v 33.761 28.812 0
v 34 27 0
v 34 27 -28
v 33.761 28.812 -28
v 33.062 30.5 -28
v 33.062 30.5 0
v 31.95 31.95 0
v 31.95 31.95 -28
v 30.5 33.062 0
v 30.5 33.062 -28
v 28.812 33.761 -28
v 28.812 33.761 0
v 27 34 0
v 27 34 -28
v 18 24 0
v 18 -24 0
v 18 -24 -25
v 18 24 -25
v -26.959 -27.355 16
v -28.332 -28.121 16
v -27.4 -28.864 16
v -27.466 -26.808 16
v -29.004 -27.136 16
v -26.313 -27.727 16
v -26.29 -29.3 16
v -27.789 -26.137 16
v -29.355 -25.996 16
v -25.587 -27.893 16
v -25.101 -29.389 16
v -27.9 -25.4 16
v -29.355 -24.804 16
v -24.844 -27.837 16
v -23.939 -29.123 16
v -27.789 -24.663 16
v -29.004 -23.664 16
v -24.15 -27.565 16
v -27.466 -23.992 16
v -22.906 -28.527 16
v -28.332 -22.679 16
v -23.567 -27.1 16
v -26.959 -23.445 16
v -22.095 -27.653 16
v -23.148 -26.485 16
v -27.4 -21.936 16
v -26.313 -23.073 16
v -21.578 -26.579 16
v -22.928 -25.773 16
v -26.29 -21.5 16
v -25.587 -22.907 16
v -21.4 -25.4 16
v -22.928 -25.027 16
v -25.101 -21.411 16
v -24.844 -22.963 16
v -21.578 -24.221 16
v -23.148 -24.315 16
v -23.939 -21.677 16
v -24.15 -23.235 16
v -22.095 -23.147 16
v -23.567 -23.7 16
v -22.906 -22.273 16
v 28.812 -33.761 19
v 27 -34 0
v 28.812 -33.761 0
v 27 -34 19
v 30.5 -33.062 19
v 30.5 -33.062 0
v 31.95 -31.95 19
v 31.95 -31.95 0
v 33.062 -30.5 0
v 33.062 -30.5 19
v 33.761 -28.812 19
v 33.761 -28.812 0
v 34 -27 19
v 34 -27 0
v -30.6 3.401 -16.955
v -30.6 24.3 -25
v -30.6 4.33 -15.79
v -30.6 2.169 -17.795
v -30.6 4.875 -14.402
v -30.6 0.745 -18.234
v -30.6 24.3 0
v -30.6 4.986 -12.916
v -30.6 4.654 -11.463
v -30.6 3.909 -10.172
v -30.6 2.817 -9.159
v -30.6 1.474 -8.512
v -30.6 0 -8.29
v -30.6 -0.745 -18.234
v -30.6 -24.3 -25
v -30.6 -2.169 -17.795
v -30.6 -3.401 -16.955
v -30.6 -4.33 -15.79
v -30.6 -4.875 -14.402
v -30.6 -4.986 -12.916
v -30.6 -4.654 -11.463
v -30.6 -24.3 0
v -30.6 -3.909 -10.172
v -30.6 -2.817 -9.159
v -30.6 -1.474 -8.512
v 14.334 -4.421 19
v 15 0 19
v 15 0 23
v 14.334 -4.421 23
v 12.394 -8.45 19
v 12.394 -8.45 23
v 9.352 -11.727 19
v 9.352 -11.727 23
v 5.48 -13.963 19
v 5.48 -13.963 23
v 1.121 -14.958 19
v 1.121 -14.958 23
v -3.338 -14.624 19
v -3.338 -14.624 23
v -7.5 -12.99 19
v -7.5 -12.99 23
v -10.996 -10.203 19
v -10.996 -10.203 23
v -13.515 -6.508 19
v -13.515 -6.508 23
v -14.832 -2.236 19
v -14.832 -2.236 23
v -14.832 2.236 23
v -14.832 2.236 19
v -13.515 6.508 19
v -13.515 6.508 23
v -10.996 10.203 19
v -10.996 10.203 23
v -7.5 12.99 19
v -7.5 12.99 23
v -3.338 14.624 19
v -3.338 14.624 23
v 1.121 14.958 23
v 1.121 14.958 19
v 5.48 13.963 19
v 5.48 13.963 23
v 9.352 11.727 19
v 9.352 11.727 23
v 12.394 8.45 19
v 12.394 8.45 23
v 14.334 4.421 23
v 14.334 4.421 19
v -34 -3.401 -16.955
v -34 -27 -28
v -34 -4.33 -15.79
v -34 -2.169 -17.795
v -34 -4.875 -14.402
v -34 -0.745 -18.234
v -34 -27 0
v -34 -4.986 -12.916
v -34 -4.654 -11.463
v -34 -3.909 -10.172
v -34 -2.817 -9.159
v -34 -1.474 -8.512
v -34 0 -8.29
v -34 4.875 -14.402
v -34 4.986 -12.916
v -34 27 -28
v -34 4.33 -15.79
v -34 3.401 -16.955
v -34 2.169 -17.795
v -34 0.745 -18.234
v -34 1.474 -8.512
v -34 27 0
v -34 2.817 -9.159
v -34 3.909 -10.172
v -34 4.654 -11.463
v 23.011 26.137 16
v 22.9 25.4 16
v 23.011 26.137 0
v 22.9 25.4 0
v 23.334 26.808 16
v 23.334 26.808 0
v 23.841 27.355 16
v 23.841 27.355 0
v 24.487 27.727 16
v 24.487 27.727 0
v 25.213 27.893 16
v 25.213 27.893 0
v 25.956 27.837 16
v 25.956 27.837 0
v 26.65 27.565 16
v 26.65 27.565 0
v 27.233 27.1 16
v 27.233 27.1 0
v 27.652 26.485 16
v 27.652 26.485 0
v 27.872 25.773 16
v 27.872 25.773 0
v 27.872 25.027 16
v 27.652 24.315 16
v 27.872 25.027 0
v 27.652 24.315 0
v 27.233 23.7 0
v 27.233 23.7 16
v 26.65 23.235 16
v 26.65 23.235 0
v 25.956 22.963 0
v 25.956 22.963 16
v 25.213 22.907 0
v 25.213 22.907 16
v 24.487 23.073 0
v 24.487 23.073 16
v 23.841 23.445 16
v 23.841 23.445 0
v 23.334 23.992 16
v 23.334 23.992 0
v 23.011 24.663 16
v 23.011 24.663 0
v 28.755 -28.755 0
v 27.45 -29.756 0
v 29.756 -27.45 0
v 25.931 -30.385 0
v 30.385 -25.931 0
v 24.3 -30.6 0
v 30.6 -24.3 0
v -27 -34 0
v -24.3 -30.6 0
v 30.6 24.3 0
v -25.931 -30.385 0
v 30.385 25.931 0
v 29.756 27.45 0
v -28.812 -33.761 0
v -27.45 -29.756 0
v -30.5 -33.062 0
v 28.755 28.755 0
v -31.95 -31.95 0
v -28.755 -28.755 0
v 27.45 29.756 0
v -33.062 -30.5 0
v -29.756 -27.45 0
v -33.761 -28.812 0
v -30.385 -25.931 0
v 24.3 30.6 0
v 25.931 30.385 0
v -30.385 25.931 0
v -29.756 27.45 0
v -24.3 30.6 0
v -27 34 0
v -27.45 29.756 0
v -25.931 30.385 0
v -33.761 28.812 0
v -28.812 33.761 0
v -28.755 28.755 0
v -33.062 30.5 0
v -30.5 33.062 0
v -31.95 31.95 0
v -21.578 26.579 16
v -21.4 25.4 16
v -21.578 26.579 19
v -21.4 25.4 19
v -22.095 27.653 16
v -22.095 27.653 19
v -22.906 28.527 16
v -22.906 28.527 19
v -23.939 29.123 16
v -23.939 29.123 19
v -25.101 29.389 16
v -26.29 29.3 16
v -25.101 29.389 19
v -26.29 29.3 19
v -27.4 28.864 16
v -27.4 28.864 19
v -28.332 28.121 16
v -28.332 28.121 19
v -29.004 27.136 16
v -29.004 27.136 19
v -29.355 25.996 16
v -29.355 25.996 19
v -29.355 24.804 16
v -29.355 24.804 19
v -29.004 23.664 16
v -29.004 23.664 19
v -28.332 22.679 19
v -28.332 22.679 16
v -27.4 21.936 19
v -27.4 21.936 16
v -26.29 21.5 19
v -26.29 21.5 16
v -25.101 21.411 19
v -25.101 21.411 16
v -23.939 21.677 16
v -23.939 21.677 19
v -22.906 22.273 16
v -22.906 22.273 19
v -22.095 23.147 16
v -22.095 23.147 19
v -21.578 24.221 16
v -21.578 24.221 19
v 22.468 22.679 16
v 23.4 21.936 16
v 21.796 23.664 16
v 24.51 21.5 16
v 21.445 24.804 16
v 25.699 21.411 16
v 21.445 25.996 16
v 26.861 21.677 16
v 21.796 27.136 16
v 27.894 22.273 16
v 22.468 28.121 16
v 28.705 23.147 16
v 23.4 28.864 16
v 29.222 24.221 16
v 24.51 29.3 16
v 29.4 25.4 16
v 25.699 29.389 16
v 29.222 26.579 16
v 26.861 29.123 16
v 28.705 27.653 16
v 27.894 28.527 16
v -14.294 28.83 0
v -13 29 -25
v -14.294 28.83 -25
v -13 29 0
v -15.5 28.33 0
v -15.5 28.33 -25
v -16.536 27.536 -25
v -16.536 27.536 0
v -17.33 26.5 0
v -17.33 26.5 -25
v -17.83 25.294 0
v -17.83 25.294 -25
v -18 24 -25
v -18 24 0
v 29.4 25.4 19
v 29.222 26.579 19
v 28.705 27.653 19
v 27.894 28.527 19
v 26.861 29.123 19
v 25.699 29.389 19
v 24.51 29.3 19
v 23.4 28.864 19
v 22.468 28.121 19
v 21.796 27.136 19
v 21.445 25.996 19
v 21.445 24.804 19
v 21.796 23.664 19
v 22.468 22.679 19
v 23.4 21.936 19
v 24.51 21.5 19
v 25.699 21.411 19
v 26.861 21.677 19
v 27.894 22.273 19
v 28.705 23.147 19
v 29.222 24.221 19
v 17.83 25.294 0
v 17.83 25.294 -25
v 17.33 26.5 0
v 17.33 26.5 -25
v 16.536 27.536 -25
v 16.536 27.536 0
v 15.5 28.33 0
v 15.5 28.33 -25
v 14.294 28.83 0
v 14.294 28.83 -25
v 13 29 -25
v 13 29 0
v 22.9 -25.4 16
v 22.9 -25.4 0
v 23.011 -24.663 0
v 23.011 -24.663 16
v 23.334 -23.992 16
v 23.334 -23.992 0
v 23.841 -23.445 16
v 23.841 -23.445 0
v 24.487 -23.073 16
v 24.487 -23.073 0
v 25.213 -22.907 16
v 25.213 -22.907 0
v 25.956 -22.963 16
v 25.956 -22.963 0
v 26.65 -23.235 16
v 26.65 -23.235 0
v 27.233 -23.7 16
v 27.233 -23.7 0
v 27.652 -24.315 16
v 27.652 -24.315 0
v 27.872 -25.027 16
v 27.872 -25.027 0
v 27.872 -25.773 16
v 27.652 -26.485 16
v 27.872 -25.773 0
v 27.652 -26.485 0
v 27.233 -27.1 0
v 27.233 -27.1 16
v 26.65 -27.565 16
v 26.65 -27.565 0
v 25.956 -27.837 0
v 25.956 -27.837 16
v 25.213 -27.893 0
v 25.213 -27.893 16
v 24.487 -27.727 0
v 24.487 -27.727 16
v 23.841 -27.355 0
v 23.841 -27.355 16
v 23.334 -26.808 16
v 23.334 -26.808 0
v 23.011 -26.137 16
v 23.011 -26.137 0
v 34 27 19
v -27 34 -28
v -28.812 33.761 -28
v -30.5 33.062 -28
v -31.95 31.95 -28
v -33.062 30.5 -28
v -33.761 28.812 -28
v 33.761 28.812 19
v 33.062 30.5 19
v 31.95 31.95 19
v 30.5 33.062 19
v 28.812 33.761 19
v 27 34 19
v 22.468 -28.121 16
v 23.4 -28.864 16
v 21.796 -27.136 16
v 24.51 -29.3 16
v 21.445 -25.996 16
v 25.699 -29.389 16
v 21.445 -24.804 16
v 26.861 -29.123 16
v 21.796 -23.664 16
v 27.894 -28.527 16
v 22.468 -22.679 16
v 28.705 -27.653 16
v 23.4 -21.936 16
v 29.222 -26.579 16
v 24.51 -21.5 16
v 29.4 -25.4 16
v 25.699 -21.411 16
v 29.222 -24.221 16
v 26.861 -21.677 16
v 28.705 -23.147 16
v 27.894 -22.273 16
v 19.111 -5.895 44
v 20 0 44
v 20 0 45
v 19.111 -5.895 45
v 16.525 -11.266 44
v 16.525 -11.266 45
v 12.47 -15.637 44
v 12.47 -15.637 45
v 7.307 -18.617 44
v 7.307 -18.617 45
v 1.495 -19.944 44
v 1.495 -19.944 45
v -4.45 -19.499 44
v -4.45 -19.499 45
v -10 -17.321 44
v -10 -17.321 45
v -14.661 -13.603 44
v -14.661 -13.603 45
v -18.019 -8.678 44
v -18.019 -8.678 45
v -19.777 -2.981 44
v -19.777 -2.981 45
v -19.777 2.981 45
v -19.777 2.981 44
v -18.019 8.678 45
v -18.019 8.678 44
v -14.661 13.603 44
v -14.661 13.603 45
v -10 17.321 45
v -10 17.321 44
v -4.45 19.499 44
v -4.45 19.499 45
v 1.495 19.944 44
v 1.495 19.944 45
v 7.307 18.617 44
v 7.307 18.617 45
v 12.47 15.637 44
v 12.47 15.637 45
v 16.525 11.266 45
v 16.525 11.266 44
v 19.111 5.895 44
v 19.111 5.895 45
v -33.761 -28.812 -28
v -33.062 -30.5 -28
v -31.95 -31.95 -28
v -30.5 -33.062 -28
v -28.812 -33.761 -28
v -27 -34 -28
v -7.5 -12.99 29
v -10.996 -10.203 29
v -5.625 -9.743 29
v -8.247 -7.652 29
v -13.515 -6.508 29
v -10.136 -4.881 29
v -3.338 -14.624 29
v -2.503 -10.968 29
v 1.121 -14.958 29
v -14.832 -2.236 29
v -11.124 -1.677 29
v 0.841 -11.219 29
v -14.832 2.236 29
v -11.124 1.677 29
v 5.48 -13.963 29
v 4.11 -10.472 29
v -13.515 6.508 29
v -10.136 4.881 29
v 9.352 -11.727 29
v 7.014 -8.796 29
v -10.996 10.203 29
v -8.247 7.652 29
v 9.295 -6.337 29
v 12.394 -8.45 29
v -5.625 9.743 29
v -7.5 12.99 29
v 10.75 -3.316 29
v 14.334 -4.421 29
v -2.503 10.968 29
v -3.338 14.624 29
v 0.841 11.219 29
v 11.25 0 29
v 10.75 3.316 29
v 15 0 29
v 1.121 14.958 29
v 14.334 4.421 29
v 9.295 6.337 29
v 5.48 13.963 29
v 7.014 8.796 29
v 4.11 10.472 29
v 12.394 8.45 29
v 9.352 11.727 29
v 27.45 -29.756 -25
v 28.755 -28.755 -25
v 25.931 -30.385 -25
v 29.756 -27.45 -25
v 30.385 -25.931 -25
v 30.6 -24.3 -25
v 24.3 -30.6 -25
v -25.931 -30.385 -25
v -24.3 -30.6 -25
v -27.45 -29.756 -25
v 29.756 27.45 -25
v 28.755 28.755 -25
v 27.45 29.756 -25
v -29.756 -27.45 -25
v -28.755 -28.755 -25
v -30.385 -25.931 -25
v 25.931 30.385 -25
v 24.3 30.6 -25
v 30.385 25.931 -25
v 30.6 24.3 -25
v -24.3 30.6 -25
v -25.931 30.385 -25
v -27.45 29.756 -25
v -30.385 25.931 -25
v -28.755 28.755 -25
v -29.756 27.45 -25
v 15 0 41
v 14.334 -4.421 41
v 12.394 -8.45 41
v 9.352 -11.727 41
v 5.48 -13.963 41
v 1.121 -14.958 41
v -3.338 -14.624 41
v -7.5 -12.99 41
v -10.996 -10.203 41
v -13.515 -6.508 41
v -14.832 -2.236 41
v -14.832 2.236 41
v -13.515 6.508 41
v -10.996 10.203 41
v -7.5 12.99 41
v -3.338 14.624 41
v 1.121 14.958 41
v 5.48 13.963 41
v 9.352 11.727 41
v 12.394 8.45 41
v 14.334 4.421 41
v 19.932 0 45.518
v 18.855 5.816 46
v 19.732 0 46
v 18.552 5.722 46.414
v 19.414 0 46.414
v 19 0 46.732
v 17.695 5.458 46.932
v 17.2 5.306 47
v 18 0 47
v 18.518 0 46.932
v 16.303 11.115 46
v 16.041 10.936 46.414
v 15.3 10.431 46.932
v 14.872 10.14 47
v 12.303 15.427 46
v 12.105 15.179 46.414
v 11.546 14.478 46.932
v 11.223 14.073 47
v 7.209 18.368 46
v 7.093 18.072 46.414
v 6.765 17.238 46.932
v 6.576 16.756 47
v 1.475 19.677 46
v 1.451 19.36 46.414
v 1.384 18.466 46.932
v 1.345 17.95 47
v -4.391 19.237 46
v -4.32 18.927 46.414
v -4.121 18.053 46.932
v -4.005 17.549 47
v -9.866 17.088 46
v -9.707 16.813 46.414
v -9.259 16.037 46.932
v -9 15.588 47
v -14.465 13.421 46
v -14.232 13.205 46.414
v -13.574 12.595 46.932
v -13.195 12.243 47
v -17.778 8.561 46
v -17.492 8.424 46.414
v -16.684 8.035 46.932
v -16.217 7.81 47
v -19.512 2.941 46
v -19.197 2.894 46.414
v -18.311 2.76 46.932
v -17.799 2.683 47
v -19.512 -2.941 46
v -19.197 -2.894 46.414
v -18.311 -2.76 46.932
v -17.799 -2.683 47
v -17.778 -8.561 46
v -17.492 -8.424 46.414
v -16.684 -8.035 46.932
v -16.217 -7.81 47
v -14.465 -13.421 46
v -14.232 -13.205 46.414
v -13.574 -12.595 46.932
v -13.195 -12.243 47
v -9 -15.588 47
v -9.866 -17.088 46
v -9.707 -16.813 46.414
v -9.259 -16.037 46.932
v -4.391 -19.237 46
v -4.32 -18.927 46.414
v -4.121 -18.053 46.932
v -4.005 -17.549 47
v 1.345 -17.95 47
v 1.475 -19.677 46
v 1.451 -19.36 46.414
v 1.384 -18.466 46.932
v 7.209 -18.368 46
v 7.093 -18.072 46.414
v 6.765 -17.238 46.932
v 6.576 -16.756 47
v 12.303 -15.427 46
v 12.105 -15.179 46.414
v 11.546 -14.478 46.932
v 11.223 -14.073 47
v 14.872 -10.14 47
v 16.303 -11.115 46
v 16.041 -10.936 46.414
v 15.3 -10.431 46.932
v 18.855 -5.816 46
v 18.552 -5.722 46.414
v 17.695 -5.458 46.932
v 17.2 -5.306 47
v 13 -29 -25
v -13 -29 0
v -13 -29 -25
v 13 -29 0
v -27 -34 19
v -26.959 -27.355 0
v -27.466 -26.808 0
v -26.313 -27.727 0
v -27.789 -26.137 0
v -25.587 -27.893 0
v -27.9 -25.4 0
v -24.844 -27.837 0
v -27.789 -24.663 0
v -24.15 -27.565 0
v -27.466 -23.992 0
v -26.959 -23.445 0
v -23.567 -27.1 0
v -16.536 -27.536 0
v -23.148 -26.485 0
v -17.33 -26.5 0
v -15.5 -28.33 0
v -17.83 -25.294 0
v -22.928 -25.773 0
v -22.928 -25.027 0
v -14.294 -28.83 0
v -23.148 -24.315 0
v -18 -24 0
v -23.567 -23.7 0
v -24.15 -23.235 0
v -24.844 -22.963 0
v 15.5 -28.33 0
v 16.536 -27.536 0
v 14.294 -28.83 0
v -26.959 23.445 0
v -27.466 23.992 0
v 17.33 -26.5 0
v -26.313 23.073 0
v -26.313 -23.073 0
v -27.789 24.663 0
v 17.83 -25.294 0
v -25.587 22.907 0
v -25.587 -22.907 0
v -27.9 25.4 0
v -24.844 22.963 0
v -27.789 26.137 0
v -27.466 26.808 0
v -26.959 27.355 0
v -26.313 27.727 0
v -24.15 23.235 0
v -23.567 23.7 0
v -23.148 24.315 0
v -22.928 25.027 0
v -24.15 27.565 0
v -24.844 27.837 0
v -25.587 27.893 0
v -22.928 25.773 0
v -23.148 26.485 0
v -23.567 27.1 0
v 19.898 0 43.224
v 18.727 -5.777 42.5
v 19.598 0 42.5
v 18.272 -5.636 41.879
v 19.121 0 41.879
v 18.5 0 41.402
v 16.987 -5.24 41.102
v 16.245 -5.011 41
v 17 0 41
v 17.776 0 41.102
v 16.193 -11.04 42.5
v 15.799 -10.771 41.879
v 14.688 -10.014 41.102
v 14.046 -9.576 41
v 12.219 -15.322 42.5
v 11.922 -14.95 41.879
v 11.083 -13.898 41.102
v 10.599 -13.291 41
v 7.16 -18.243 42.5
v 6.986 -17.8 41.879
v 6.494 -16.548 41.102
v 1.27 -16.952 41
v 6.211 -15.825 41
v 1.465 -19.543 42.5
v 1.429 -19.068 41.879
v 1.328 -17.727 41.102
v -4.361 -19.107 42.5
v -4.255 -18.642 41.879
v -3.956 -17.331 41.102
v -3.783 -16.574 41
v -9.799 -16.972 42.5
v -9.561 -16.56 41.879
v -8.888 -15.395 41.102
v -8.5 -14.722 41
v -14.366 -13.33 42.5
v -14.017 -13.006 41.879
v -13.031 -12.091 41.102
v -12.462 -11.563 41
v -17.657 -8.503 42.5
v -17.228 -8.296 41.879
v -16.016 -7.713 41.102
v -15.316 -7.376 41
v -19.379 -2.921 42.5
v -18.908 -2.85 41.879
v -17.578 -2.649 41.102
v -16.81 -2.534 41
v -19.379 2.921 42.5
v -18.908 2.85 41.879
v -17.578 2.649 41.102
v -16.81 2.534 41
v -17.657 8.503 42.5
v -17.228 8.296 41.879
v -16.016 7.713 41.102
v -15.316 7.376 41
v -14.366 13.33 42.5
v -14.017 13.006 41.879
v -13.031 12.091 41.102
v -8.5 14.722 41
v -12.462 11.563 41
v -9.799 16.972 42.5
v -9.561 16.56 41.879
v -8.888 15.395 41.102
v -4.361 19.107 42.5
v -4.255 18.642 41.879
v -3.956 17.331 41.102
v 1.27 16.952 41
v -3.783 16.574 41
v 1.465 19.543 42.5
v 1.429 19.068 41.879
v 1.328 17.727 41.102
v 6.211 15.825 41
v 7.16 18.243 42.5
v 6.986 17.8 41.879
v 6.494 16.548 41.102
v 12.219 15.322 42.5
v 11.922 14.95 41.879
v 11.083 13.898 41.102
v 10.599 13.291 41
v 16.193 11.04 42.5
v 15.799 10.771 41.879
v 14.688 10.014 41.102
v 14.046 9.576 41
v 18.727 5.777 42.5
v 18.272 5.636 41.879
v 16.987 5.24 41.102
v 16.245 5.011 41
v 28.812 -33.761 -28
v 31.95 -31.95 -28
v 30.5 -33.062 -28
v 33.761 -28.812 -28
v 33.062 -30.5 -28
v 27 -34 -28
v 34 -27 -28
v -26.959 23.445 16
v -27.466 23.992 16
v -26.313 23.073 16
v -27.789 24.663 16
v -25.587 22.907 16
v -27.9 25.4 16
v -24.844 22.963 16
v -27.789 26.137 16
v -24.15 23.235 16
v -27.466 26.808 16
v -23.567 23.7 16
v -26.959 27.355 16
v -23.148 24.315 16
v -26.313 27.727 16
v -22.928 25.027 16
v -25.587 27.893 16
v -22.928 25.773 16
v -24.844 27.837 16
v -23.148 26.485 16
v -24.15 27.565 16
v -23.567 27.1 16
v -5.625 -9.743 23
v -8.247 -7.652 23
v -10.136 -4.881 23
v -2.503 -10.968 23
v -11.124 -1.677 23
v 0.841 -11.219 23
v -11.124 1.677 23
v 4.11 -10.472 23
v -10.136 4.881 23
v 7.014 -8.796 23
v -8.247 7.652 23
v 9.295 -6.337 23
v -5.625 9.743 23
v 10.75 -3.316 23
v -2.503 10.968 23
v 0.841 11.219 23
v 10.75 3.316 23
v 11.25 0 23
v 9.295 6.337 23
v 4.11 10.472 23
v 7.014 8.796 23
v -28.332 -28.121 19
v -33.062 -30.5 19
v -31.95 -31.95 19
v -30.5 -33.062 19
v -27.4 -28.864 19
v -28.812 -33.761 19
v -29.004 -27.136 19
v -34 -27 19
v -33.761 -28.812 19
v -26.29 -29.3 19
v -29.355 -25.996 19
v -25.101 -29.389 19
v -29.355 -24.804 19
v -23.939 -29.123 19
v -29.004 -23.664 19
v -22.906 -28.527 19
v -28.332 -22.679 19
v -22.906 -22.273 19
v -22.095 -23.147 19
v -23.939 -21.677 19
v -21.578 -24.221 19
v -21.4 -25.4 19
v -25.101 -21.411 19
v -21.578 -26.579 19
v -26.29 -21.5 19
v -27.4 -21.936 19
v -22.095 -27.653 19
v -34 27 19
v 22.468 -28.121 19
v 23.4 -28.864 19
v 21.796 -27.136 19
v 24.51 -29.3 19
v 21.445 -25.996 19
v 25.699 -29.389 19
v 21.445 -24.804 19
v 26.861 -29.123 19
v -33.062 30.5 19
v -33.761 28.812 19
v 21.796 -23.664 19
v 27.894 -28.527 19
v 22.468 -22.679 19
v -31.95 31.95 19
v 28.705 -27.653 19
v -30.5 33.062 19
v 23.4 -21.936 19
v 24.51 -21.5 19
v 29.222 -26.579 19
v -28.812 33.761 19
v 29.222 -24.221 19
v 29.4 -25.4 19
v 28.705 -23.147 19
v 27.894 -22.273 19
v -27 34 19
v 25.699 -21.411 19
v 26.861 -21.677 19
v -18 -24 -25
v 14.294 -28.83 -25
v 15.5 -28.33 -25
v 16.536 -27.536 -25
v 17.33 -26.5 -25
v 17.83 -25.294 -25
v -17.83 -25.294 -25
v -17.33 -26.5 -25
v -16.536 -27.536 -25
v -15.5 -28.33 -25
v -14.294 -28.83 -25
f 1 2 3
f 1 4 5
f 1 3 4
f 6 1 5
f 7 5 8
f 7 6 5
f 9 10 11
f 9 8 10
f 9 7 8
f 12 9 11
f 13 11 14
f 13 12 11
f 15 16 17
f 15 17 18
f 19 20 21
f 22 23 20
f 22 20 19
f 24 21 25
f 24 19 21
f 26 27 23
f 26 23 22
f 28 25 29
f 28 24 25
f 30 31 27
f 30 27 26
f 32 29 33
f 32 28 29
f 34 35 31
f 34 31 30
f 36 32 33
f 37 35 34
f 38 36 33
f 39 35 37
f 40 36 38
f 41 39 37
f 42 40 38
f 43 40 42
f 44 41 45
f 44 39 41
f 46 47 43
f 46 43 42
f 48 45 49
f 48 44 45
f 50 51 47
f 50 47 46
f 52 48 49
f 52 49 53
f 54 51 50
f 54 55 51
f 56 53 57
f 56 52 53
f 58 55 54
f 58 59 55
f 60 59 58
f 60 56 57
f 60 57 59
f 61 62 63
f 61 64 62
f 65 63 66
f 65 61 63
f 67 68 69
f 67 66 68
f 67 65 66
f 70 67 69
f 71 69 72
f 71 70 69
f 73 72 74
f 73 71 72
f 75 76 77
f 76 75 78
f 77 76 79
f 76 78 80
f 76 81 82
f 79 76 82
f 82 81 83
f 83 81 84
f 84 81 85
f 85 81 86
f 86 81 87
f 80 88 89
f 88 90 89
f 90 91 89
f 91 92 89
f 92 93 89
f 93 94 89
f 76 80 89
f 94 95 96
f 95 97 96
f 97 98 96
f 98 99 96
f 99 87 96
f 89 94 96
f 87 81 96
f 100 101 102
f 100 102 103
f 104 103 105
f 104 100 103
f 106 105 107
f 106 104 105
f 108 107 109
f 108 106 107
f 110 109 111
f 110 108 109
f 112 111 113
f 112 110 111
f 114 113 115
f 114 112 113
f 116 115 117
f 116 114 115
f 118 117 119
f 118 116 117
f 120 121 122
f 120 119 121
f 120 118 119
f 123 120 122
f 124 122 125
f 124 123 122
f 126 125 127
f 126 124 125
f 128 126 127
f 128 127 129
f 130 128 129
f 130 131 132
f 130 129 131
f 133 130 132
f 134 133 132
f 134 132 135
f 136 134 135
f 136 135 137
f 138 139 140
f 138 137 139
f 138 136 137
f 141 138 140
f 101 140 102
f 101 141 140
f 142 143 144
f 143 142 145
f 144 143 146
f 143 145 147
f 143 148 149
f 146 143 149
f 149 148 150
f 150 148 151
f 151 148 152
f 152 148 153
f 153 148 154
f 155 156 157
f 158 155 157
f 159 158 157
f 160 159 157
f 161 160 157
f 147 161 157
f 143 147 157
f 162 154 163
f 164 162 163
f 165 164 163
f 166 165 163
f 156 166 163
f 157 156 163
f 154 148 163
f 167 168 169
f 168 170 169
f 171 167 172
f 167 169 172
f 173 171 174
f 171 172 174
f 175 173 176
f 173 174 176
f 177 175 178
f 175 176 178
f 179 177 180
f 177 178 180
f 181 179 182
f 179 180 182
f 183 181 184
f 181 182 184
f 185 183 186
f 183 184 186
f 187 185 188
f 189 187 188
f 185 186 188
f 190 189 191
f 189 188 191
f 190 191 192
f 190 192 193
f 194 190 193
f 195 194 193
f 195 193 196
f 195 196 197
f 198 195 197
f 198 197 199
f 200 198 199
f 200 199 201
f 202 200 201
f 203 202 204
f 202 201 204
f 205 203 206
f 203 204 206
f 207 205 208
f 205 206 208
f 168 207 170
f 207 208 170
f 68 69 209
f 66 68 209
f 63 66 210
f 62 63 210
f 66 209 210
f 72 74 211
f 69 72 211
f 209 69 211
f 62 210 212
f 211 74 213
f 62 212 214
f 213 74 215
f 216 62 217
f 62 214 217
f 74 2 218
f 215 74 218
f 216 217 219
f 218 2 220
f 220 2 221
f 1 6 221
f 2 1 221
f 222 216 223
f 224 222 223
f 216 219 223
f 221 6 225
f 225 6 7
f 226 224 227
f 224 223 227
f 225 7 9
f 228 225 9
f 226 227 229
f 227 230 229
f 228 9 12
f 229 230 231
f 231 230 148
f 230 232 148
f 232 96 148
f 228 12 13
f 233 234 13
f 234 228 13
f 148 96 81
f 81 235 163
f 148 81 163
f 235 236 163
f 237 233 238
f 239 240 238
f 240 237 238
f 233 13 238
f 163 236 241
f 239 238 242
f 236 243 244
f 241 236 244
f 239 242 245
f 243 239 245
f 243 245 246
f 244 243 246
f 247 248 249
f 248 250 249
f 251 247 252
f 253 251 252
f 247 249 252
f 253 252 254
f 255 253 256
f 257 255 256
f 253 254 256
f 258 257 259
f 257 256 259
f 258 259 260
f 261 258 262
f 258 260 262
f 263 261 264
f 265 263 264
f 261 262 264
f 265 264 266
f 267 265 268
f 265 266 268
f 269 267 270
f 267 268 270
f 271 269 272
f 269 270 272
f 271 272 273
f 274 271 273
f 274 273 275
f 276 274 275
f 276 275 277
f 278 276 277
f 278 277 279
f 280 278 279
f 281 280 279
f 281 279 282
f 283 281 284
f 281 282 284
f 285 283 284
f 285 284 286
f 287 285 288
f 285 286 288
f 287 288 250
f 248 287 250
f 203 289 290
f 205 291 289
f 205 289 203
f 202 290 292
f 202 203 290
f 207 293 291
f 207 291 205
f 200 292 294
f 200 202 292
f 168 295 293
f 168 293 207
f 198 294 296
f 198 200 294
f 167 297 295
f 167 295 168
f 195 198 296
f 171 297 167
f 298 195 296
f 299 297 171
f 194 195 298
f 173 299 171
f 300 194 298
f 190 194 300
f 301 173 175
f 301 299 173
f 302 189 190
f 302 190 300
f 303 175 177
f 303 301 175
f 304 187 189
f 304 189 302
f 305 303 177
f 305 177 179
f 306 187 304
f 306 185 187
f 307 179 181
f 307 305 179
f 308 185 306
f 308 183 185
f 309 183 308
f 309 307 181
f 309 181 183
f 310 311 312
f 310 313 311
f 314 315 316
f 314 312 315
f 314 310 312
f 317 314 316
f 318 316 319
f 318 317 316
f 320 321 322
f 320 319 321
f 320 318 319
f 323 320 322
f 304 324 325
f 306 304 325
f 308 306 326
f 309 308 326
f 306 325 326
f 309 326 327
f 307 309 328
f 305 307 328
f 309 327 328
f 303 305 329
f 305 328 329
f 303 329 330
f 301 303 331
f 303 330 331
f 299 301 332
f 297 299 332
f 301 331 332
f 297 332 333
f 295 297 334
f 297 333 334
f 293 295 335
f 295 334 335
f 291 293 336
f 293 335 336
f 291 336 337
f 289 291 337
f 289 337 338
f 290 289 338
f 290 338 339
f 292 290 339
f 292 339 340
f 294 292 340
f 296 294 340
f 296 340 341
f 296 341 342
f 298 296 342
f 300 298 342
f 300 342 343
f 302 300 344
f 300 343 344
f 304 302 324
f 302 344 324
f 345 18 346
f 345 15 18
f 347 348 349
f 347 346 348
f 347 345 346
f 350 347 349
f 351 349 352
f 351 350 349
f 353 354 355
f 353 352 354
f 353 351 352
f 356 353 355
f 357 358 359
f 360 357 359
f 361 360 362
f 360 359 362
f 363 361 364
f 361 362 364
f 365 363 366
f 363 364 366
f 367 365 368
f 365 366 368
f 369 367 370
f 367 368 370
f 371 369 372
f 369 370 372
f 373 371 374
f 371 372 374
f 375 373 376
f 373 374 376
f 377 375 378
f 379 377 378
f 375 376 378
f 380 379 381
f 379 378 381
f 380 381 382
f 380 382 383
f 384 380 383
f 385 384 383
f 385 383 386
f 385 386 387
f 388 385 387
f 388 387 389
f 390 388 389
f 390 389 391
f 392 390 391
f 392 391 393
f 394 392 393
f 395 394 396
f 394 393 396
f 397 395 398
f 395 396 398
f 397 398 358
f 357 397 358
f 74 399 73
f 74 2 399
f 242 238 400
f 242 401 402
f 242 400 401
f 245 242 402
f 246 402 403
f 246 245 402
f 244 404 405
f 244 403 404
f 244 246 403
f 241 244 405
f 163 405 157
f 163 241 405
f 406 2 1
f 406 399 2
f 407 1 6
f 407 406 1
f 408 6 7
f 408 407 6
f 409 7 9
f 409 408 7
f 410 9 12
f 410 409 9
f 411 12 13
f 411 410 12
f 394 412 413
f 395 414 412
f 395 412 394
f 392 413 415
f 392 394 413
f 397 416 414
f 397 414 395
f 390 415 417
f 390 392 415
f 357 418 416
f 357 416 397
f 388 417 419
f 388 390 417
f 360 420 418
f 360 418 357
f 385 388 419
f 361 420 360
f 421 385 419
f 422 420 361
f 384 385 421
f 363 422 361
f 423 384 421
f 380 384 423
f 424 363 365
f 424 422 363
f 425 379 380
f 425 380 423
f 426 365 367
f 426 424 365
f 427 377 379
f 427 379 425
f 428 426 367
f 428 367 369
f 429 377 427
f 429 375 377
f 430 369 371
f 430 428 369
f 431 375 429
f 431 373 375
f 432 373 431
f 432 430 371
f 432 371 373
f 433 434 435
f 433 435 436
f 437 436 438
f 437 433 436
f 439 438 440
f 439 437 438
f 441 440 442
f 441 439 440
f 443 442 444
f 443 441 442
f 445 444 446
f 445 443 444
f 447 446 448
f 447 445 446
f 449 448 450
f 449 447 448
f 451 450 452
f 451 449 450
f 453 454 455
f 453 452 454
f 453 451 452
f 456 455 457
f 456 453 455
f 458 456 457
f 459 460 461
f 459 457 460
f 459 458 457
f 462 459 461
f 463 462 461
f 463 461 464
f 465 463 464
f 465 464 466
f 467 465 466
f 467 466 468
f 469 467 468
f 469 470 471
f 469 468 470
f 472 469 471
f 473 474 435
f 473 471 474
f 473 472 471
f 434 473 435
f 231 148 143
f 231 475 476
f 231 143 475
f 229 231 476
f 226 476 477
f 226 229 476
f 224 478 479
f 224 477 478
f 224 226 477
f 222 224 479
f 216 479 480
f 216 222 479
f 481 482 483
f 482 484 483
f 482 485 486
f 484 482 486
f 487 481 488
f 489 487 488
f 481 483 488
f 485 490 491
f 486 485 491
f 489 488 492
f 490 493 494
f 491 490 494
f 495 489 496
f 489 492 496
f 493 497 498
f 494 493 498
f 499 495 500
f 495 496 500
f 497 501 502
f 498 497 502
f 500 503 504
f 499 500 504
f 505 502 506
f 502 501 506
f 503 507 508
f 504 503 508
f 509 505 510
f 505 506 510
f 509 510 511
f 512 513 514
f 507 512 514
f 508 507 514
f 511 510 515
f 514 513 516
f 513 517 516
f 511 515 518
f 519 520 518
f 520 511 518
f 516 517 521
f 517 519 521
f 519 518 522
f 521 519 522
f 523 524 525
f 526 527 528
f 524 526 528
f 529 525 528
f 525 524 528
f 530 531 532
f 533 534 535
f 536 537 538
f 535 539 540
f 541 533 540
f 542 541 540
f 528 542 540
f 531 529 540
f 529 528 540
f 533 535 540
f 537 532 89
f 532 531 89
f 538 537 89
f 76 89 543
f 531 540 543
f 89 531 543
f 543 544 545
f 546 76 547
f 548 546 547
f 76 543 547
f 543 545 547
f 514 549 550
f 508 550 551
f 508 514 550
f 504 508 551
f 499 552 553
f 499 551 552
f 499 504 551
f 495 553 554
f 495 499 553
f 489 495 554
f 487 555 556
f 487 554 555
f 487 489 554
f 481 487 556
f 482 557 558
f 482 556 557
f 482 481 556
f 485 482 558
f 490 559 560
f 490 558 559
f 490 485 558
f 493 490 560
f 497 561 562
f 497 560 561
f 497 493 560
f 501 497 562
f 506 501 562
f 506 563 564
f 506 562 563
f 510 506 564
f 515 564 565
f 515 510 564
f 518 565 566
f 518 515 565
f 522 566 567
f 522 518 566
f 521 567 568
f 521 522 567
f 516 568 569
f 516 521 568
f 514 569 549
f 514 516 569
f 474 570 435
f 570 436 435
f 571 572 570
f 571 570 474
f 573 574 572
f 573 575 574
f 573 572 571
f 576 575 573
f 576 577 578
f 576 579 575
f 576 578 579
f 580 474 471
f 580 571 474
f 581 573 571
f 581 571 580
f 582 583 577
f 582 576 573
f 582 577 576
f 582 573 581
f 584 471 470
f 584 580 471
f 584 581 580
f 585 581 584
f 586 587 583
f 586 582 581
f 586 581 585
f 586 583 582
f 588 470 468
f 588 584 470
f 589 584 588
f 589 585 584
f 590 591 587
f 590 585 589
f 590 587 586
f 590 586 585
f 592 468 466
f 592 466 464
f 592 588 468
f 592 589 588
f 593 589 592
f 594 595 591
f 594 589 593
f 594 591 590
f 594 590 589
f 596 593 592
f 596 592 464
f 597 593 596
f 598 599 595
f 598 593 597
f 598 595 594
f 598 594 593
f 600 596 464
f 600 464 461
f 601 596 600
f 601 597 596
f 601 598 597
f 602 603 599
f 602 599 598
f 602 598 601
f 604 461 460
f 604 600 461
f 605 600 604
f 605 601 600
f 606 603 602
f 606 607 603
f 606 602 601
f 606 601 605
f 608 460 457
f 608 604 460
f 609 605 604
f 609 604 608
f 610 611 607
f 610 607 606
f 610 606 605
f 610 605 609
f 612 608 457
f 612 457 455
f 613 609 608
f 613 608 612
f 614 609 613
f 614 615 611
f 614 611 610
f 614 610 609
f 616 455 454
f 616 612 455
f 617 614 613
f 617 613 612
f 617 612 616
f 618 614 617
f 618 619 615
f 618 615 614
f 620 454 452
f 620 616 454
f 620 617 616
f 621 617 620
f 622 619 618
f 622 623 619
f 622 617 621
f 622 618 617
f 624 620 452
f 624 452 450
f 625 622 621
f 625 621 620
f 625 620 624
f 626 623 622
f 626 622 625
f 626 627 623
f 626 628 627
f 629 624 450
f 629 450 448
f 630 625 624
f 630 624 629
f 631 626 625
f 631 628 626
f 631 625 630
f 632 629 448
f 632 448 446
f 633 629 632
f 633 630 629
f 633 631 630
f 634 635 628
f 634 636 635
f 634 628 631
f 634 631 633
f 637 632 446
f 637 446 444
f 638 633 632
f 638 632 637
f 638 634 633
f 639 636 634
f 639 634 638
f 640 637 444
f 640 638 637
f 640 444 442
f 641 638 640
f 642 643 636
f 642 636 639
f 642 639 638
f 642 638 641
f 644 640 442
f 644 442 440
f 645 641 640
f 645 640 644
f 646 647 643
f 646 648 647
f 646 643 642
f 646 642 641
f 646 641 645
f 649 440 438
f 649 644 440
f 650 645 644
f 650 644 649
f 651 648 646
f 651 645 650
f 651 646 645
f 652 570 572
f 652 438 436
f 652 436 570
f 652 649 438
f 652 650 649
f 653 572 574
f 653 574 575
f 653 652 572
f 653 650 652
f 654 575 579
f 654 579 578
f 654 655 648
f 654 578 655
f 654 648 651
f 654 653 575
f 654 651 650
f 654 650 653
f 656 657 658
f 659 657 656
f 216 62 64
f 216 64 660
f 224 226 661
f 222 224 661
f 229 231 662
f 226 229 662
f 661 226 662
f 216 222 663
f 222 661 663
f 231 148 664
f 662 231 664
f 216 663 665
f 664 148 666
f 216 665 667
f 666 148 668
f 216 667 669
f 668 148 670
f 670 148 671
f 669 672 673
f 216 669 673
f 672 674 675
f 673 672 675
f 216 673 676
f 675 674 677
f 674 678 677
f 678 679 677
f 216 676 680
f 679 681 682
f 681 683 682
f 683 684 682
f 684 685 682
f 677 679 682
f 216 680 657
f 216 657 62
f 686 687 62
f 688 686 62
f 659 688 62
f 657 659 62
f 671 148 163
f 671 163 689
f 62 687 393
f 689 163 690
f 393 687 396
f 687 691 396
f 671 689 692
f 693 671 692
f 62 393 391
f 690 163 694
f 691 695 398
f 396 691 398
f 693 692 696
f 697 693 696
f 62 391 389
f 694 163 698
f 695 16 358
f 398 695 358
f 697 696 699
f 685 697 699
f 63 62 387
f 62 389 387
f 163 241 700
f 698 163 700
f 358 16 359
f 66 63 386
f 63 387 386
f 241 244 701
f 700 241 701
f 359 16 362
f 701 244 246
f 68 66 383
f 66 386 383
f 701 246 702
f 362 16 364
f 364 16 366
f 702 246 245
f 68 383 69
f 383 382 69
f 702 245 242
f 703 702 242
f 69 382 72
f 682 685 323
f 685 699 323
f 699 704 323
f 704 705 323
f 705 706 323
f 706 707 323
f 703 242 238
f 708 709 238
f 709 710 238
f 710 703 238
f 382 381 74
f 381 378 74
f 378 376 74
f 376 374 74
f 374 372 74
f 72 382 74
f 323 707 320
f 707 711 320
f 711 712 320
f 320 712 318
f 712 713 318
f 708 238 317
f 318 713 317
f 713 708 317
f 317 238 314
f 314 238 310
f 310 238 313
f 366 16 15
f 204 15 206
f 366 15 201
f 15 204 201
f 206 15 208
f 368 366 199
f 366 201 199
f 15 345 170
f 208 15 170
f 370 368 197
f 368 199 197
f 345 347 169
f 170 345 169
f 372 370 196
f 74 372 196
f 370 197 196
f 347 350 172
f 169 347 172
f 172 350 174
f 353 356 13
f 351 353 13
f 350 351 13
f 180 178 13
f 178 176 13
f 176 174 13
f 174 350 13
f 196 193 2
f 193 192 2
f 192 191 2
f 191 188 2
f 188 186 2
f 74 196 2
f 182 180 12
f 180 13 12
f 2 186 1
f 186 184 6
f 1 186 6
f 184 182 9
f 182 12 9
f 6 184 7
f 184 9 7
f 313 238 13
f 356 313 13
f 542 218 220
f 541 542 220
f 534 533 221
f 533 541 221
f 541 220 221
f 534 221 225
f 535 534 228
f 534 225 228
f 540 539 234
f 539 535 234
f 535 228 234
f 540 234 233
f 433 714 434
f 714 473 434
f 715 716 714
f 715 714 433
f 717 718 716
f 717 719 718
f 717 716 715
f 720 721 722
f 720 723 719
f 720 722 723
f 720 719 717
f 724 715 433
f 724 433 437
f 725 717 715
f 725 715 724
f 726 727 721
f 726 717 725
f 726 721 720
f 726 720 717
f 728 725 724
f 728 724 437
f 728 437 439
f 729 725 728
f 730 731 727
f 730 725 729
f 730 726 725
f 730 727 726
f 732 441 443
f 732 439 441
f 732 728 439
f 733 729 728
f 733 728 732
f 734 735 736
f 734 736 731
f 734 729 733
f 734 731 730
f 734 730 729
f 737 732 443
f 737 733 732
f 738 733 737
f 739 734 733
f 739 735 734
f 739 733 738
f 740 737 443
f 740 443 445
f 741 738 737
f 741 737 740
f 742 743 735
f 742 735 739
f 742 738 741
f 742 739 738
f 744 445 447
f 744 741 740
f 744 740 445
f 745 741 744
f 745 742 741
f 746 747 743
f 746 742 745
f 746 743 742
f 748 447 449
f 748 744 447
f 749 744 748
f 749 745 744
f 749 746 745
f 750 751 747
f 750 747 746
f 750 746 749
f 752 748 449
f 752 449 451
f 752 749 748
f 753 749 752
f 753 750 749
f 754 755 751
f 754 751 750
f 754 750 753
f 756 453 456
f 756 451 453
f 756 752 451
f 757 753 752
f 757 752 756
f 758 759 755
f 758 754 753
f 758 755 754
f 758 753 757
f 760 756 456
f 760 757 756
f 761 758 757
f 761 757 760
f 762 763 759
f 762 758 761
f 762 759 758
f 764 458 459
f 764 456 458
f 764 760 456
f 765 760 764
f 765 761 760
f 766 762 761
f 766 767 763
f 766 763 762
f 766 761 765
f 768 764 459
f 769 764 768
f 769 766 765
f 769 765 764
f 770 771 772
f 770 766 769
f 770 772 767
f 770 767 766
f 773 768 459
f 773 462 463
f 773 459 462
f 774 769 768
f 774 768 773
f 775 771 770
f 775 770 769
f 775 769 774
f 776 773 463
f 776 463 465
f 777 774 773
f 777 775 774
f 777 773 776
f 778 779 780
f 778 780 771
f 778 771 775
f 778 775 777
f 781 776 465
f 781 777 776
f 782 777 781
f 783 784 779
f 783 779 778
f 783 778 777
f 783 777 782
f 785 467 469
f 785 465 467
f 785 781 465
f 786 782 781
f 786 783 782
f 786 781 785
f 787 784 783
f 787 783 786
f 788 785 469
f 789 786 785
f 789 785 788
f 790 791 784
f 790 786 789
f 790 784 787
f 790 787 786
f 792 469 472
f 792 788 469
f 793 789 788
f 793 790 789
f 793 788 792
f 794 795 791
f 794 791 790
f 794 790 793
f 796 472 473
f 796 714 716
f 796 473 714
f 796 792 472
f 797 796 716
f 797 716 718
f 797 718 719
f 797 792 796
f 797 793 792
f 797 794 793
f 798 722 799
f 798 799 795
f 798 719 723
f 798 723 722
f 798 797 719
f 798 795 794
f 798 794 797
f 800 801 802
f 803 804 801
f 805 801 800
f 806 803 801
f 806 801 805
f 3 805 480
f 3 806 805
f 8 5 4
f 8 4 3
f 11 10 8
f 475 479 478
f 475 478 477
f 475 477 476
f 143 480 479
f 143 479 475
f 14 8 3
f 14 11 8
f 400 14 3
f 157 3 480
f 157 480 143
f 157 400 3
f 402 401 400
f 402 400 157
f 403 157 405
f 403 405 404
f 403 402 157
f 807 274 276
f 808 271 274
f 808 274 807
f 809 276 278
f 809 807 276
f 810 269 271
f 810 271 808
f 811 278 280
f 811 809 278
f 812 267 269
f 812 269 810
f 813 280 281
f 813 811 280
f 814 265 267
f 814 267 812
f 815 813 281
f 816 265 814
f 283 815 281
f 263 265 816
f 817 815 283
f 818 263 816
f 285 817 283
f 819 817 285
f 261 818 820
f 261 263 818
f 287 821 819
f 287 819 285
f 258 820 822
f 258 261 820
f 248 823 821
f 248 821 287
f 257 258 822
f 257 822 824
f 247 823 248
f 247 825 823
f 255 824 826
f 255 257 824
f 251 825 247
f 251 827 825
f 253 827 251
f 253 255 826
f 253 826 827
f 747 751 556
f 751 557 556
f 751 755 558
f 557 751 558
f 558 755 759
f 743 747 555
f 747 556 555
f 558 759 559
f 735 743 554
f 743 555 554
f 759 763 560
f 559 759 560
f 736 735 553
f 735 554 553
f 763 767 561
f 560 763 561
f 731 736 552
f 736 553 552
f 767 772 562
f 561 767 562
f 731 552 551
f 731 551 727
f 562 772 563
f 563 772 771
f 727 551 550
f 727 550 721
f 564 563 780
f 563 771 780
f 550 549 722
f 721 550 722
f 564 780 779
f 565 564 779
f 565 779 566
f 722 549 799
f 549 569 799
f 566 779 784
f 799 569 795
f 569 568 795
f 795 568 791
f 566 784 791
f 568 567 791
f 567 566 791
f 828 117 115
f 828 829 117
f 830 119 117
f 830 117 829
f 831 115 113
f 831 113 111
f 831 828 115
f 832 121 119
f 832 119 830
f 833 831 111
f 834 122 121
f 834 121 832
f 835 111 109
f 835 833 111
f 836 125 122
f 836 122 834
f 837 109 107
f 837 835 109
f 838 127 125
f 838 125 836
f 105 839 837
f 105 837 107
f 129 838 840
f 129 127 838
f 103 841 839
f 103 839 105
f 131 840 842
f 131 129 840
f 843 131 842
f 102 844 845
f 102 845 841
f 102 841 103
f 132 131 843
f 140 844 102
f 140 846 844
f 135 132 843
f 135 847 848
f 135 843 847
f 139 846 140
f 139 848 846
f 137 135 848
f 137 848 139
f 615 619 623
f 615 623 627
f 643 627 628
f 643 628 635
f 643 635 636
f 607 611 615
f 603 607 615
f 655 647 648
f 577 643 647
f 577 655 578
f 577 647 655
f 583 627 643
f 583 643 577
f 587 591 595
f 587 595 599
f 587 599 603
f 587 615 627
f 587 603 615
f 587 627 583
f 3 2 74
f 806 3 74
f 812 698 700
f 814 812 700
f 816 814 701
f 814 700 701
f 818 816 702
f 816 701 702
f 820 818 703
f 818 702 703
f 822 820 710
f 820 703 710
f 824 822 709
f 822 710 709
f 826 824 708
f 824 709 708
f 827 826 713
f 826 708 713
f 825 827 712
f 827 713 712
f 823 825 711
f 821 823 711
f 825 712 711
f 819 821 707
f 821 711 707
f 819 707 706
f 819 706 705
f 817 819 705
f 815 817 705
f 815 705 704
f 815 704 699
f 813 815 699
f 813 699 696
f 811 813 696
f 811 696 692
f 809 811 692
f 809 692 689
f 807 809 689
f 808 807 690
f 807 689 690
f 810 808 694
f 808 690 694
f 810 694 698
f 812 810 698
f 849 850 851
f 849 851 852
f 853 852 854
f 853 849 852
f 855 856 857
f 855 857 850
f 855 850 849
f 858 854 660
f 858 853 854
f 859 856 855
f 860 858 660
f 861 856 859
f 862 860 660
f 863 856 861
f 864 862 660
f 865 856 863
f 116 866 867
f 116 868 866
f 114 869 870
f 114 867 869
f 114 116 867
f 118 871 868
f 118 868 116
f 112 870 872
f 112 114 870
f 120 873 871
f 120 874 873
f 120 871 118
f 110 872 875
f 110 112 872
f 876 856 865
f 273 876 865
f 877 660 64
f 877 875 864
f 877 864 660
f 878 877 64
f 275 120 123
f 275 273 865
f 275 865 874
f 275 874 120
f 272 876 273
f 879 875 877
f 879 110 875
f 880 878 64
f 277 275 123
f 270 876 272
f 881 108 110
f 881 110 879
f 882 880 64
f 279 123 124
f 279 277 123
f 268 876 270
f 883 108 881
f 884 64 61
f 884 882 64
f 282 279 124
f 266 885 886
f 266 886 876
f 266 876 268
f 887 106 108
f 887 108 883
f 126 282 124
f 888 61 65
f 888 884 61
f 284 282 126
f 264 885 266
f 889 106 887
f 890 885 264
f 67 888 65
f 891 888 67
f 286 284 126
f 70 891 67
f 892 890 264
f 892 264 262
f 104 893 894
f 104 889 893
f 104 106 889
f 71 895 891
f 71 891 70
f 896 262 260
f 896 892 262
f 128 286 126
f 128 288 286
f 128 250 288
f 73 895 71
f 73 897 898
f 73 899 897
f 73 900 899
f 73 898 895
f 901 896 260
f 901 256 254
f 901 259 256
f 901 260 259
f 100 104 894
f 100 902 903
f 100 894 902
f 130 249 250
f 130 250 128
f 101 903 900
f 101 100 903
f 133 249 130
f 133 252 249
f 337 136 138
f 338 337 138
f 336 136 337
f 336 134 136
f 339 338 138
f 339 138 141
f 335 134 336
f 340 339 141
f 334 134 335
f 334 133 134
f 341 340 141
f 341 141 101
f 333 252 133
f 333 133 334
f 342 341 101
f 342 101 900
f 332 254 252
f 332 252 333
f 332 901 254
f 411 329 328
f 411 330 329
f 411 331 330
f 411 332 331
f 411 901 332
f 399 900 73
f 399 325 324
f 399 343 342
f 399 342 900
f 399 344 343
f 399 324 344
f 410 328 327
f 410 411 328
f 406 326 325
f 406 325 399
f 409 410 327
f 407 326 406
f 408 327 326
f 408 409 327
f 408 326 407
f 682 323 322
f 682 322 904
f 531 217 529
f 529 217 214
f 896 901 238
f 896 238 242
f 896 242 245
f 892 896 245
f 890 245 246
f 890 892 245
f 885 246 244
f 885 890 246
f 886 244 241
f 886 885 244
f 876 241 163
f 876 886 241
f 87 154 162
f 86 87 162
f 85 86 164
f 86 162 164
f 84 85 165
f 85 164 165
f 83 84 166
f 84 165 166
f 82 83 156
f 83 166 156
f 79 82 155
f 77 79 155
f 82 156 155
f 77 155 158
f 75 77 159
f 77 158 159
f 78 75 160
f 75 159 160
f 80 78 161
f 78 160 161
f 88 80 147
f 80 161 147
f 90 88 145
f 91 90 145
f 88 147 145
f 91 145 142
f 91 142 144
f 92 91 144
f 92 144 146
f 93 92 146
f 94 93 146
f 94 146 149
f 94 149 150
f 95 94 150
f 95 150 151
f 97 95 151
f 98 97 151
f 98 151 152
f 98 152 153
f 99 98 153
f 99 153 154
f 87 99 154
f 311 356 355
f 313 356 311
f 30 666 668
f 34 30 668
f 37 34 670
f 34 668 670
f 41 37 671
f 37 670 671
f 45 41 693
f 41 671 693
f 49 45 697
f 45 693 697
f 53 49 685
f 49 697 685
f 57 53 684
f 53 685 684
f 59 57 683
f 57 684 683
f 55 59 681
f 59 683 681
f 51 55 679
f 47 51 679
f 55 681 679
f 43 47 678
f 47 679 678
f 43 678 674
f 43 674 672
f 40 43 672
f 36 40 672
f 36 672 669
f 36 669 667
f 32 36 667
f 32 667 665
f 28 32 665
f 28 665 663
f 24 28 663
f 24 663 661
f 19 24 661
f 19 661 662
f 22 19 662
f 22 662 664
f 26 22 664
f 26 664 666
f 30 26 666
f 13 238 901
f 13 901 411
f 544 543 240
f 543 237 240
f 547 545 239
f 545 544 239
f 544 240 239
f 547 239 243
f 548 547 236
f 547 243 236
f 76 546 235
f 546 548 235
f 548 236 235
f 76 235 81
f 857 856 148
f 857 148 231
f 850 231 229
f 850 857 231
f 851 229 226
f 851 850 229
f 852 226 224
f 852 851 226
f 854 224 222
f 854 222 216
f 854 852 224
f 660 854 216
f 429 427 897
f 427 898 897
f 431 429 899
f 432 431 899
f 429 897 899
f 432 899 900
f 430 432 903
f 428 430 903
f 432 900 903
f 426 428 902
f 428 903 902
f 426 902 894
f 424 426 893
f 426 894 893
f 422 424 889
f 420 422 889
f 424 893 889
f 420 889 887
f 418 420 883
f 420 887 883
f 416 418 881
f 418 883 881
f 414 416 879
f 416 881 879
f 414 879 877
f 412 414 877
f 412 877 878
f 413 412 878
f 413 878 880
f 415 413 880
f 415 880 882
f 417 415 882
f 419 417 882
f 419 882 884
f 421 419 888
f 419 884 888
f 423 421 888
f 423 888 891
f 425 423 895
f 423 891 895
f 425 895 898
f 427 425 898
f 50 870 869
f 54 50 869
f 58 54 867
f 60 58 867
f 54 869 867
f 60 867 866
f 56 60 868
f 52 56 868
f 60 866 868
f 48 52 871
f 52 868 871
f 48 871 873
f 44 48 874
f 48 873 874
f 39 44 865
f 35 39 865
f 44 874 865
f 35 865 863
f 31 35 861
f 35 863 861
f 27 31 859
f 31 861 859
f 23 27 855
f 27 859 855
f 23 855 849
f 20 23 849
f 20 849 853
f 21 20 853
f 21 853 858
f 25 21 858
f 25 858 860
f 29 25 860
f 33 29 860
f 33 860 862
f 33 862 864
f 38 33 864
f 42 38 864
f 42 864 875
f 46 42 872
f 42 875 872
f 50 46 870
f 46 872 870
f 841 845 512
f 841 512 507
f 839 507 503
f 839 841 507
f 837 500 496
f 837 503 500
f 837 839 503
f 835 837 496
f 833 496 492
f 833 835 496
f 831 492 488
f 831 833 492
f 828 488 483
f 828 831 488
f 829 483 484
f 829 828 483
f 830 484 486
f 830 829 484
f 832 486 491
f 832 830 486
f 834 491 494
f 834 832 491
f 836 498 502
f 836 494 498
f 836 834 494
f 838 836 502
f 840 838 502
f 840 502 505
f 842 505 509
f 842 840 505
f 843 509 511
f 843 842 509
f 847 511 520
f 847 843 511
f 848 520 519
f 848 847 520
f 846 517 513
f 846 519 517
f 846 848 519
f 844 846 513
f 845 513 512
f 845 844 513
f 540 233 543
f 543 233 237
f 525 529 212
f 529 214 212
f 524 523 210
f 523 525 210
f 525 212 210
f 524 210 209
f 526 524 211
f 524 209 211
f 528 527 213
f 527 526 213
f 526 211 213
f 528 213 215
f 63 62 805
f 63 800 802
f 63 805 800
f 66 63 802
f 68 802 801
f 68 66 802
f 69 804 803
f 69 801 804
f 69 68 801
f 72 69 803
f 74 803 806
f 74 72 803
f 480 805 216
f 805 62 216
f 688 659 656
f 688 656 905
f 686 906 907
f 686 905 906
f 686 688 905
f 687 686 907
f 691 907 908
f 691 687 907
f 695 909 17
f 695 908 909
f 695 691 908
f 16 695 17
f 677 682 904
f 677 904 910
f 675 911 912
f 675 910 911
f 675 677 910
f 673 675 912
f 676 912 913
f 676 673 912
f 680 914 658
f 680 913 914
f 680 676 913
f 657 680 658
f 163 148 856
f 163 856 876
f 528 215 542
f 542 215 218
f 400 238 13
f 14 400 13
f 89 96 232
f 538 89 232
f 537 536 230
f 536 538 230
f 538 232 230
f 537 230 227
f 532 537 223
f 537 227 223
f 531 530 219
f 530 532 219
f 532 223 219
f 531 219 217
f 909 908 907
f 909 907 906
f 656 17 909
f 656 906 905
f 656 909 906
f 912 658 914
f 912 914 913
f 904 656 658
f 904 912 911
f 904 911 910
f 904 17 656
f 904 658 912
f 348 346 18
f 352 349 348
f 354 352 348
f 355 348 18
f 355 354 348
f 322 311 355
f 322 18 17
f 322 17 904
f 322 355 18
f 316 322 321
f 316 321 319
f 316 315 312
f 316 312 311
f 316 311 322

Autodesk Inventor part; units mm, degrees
ref_plane "YZ Plane" through (0, 0, 0) normal (1, 0, 0) x (0, 1, 0)
ref_plane "XZ Plane" through (0, 0, 0) normal (0, 1, 0) x (-1, 0, 0)
ref_plane "XY Plane" through (0, 0, 0) normal (0, 0, 1) x (1, 0, 0)
sketch "Sketch1" plane through (0, 0, 0) normal (0, 0, 1) x (1, 0, 0)
  line L0 (-34, 34) -> (34, 34)
  line L1 (34, 34) -> (34, -34)
  line L2 (34, -34) -> (-34, -34)
  line L3 (-34, -34) -> (-34, 34)
  point P0 (0, 0)
  dimension "d0" = 34
  dimension "d1" = 34
  dimension "d2" = 34
  dimension "d3" = 34
extrude "Extrusion1" add sketch "Sketch1" along normal blind 19
sketch "Sketch2" plane through (0, 0, 19) normal (0, 0, 1) x (1, 0, 0)
  circle A0 centre (0, 0) radius 15
  dimension "d6" = 30
extrude "Extrusion2" add sketch "Sketch2" along normal blind 4
sketch "Sketch3" plane through (0, 0, 23) normal (0, 0, 1) x (1, 0, 0)
  circle A0 centre (0, 0) radius 11.25
  dimension "d9" = 22.5
extrude "Extrusion3" add sketch "Sketch3" along normal blind 6
sketch "Sketch4" plane through (0, 0, 29) normal (0, 0, 1) x (1, 0, 0)
  circle A0 centre (0, 0) radius 15
  dimension "d12" = 30
extrude "Extrusion4" add sketch "Sketch4" along normal blind 12
sketch "Sketch5" plane through (0, 0, 41) normal (0, 0, 1) x (1, 0, 0)
  circle A0 centre (0, 0) radius 20
  dimension "d15" = 40
extrude "Extrusion5" add sketch "Sketch5" along normal blind 6
fillet "Fillet1" radius 2 1 edges at (-20, 0, 47)
fillet "Fillet2" radius 3 1 edges at (-20, 0, 41)
fillet "Fillet3" radius 7 4 edges at (34, 34, 9.5) (-34, 34, 9.5) (34, -34, 9.5) (-34, -34, 9.5)
sketch "Sketch6" plane through (0, 0, 0) normal (0, 0, -1) x (-1, 0, 0)
  arc A0 (-27, 34) -> (-34, 27) centre (-27, 27) ccw projected
  arc A1 (27, -34) -> (34, -27) centre (27, -27) ccw projected
  line L0 (-27, 27) -> (27, -27)
  arc A2 (34, 27) -> (27, 34) centre (27, 27) ccw projected
  arc A3 (-34, -27) -> (-27, -34) centre (-27, -27) ccw projected
  line L1 (27, 27) -> (-27, -27)
  circle A4 centre (-25.4, 25.4) radius 2.5
  circle A5 centre (25.4, 25.4) radius 2.5
  circle A6 centre (25.4, -25.4) radius 2.5
  circle A7 centre (-25.4, -25.4) radius 2.5
  point P0 (0, 0)
  dimension "d21" = 5
  dimension "d22" = 25.4
  dimension "d23" = 5
  dimension "d24" = 5
  dimension "d25" = 5
extrude "Extrusion6" cut sketch "Sketch6" against normal blind 20
sketch "Sketch7" plane through (0, 0, 19) normal (0, 0, 1) x (1, 0, 0)
  circle A0 centre (-25.4, 25.4) radius 2.5 projected
  circle A1 centre (-25.4, 25.4) radius 4
  circle A2 centre (25.4, 25.4) radius 2.5 projected
  circle A3 centre (25.4, 25.4) radius 4
  circle A4 centre (25.4, -25.4) radius 2.5 projected
  circle A5 centre (25.4, -25.4) radius 4
  circle A6 centre (-25.4, -25.4) radius 2.5 projected
  circle A7 centre (-25.4, -25.4) radius 4
  point P0 (0, 0)
  dimension "d28" = 8
  dimension "d29" = 8
  dimension "d30" = 8
  dimension "d31" = 8
extrude "Extrusion7" cut sketch "Sketch7" against normal blind 3
sketch "Sketch8" plane through (0, 0, 0) normal (0, 0, -1) x (-1, 0, 0)
  line L0 (-13, 29) -> (13, 29)
  line L1 (18, 24) -> (18, -24)
  line L2 (13, -29) -> (-13, -29)
  line L3 (-18, -24) -> (-18, 24)
  arc A0 (-13, 29) -> (-18, 24) centre (-13, 24) ccw
  arc A1 (18, 24) -> (13, 29) centre (13, 24) ccw
  arc A2 (13, -29) -> (18, -24) centre (13, -24) ccw
  arc A3 (-18, -24) -> (-13, -29) centre (-13, -24) ccw
  point P0 (0, 0)
  dimension "d34" = 18
  dimension "d35" = 18
  dimension "d36" = 29
  dimension "d37" = 29
  dimension "d38" = 5
extrude "Extrusion8" add sketch "Sketch8" along normal blind 25
sketch "Sketch9" plane through (0, 0, 0) normal (0, 0, -1) x (-1, 0, 0)
  arc A0 (18, 24) -> (13, 29) centre (13, 24) ccw projected
  line L0 (18, 24) -> (18, -24) projected
  arc A1 (13, -29) -> (18, -24) centre (13, -24) ccw projected
  line L1 (13, -29) -> (-13, -29) projected
  arc A2 (-18, -24) -> (-13, -29) centre (-13, -24) ccw projected
  line L2 (-18, -24) -> (-18, 24) projected
  arc A3 (-13, 29) -> (-18, 24) centre (-13, 24) ccw projected
  line L3 (-13, 29) -> (13, 29) projected
  circle A4 centre (25.4, -25.4) radius 2.5 projected
  circle A5 centre (-25.4, 25.4) radius 2.5 projected
  circle A6 centre (25.4, 25.4) radius 2.5 projected
  circle A7 centre (-25.4, -25.4) radius 2.5 projected
  arc A8 (27, -34) -> (34, -27) centre (27, -27) ccw projected
  line L4 (34, -27) -> (34, 27) projected
  arc A9 (34, 27) -> (27, 34) centre (27, 27) ccw projected
  line L5 (27, 34) -> (-27, 34) projected
  arc A10 (-27, 34) -> (-34, 27) centre (-27, 27) ccw projected
  line L6 (-34, 27) -> (-34, -27) projected
  arc A11 (-34, -27) -> (-27, -34) centre (-27, -27) ccw projected
  line L7 (-27, -34) -> (27, -34) projected
  line L8 (-34, 27) -> (-34, -27) projected
  arc A12 (-27, 34) -> (-34, 27) centre (-27, 27) ccw projected
  line L9 (-34, -27) -> (-34, 27)
  line L10 (-27, 34) -> (27, 34)
  arc A13 (27, -34) -> (34, -27) centre (27, -27) ccw projected
  line L11 (34, 27) -> (34, -27)
  line L12 (27, -34) -> (-27, -34)
  arc A14 (-34, -27) -> (-27, -34) centre (-27, -27) ccw
  arc A15 (-27, 34) -> (-34, 27) centre (-27, 27) ccw
  line L13 (-27, 34) -> (27, 34) projected
  arc A16 (34, 27) -> (27, 34) centre (27, 27) ccw
  arc A17 (27, -34) -> (34, -27) centre (27, -27) ccw
  line L14 (-30.6, -24.3) -> (-30.6, 24.3)
  line L15 (-24.3, 30.6) -> (24.3, 30.6)
  line L16 (30.6, 24.3) -> (30.6, -24.3)
  line L17 (24.3, -30.6) -> (-24.3, -30.6)
  arc A18 (-30.6, -24.3) -> (-24.3, -30.6) centre (-24.3, -24.3) ccw
  arc A19 (-24.3, 30.6) -> (-30.6, 24.3) centre (-24.3, 24.3) ccw
  arc A20 (30.6, 24.3) -> (24.3, 30.6) centre (24.3, 24.3) ccw
  arc A21 (24.3, -30.6) -> (30.6, -24.3) centre (24.3, -24.3) ccw
  point P0 (0, 0)
  point P1 (0, 0)
extrude "Extrusion9" add sketch "Sketch9" along normal up to surface (25 mm away) separate body contours L7 A11 L6 A10 L5 A9 L4 A8
sketch "Sketch10" plane through (-34, -27, 0) normal (-1, 0, 0) x (0, 0, 1)
  circle A0 centre (-13.2898, 27) radius 5
  point P0 (0, 27)
  dimension "d43" = 10
extrude "Extrusion10" cut sketch "Sketch10" against normal blind 10 bodies 2
sketch "Sketch11" plane through (27, -34, -25) normal (0, 0, -1) x (-1, 0, 0)
  arc A0 (-3.6, 9.7) -> (2.7, 3.4) centre (2.7, 9.7) ccw projected
  line L0 (-3.6, 9.7) -> (-3.6, 58.3) projected
  arc A1 (2.7, 64.6) -> (-3.6, 58.3) centre (2.7, 58.3) ccw projected
  line L1 (2.7, 64.6) -> (51.3, 64.6) projected
  arc A2 (57.6, 58.3) -> (51.3, 64.6) centre (51.3, 58.3) ccw projected
  line L2 (57.6, 58.3) -> (57.6, 9.7) projected
  arc A3 (51.3, 3.4) -> (57.6, 9.7) centre (51.3, 9.7) ccw projected
  line L3 (51.3, 3.4) -> (2.7, 3.4) projected
  line L4 (0, 0) -> (54, 0) projected
  arc A4 (54, 0) -> (61, 7) centre (54, 7) ccw projected
  line L5 (61, 7) -> (61, 61) projected
  arc A5 (61, 61) -> (54, 68) centre (54, 61) ccw projected
  line L6 (54, 68) -> (0, 68) projected
  arc A6 (0, 68) -> (-7, 61) centre (0, 61) ccw projected
  line L7 (-7, 61) -> (-7, 7) projected
  arc A7 (-7, 7) -> (0, 0) centre (0, 7) ccw projected
  point P0 (27, 34)
extrude "Extrusion11" add sketch "Sketch11" along normal blind 3 contours L0 A1 L1 A2 L2 A3 L3 A0 | A7 L7 A6 L6 A5 L5 A4 L4 bodies 2
properties part number "E-Stop"
